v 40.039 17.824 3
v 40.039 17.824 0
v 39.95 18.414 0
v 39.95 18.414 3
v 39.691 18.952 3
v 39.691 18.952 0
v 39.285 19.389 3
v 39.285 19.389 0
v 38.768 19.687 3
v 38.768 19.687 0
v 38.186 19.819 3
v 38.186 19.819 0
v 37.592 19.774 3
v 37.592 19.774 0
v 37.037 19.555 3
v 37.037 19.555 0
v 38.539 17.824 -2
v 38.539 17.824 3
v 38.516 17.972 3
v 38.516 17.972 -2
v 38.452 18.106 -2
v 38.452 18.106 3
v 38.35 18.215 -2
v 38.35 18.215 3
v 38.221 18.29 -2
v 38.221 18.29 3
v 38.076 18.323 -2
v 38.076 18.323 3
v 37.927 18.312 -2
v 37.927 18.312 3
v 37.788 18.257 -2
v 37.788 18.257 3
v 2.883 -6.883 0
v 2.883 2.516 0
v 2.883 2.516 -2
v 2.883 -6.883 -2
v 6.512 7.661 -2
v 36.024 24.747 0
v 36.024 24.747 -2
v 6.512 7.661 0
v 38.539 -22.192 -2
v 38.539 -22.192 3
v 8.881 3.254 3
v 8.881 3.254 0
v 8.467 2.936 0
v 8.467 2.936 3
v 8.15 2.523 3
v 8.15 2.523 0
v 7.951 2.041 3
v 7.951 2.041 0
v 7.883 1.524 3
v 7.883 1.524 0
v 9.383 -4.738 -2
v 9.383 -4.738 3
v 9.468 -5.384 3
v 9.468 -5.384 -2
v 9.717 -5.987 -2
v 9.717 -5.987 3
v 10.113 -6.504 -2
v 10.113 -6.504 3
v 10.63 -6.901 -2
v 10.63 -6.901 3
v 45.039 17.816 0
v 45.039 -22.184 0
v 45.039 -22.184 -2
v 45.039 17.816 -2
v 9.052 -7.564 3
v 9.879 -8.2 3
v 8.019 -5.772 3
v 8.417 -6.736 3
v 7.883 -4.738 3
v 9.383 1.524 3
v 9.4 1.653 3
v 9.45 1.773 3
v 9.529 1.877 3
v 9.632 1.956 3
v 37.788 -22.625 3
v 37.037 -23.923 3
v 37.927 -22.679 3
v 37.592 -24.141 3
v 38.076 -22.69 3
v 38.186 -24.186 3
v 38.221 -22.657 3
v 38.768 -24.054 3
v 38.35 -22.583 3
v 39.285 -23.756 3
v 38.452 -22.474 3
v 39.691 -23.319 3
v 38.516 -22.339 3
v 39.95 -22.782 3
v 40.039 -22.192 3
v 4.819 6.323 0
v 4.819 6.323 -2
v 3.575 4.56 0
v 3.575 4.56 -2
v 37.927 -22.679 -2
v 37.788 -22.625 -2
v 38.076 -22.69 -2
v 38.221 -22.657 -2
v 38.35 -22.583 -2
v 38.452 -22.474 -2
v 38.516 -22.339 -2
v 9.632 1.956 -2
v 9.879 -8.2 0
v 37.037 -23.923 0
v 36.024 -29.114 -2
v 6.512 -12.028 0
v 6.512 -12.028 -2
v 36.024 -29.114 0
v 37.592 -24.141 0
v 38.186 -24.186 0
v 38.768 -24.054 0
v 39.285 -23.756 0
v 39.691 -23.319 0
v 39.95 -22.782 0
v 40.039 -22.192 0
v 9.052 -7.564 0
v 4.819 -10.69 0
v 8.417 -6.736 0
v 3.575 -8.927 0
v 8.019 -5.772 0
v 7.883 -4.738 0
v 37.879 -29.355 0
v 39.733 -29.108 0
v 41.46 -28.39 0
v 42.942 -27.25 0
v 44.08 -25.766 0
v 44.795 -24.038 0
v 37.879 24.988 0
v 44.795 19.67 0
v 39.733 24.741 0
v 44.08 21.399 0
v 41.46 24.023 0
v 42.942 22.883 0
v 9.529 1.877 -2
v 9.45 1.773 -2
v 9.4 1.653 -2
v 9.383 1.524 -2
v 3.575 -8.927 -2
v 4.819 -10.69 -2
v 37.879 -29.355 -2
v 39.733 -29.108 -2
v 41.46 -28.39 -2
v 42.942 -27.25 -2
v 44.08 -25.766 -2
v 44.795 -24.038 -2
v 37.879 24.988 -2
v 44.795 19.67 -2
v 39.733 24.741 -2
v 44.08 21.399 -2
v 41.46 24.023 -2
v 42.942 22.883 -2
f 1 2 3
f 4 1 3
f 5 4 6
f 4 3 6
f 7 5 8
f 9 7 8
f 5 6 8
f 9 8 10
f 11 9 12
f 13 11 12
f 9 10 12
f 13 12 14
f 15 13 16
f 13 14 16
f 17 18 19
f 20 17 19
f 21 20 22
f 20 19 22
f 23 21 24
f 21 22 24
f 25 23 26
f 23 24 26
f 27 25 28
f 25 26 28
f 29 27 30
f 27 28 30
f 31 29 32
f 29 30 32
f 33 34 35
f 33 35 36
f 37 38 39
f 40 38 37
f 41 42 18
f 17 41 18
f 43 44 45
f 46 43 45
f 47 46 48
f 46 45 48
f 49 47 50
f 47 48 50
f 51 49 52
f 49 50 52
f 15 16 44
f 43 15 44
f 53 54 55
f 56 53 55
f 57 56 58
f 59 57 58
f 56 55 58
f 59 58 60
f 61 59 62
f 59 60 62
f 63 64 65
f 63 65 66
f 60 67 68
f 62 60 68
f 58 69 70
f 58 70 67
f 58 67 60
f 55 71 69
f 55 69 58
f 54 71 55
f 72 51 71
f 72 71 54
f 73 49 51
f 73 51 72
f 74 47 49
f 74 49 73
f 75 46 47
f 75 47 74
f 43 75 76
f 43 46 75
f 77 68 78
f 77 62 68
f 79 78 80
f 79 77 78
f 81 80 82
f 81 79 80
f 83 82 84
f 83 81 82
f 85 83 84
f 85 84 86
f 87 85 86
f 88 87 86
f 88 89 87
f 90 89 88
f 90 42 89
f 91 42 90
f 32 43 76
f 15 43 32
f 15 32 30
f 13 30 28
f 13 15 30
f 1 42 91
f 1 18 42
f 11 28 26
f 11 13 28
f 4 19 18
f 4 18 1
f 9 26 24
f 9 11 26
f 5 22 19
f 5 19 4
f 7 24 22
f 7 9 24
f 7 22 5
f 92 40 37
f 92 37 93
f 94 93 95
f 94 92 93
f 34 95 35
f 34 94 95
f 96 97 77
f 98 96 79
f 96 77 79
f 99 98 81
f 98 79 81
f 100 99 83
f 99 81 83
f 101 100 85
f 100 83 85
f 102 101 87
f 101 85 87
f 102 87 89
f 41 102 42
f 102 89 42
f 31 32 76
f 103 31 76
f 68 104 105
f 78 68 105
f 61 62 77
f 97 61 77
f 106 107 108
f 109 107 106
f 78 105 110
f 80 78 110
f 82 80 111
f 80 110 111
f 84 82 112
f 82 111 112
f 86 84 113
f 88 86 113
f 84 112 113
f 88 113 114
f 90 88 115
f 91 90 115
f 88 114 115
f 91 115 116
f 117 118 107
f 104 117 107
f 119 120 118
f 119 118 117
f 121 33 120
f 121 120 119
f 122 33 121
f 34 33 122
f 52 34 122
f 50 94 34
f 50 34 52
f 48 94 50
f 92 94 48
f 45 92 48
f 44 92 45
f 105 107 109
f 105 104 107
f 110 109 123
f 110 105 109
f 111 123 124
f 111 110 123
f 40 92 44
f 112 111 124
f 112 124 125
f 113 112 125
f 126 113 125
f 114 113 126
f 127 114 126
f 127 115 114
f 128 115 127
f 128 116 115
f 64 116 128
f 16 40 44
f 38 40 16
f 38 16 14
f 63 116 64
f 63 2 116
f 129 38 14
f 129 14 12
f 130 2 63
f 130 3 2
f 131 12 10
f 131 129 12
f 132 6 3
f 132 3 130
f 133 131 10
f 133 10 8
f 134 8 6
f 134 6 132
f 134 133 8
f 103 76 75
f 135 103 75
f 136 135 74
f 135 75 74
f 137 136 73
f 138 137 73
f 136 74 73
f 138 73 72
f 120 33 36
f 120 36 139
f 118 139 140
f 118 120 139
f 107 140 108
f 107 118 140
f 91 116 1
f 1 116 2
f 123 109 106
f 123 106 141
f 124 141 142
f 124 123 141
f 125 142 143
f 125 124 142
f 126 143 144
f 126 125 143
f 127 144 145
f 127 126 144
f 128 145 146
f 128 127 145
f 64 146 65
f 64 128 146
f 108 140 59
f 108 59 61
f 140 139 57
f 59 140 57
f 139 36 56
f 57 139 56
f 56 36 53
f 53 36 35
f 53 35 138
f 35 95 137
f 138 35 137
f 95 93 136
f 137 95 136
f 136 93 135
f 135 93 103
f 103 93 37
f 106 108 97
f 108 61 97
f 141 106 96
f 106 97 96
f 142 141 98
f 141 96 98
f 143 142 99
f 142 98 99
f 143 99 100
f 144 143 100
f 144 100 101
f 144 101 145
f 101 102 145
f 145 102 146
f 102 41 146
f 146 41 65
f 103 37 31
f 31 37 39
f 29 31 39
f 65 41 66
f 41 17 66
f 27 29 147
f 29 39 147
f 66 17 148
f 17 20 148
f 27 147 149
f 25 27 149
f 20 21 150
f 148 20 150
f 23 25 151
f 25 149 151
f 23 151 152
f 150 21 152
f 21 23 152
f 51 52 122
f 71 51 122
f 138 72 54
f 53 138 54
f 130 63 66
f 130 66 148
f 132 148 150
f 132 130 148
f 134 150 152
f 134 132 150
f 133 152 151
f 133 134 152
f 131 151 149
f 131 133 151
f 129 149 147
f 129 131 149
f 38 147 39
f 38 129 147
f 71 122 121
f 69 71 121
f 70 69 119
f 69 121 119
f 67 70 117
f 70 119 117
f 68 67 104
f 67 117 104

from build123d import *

# Parameters (mm, degrees)
F2_DEPTH = 3
F4_DEPTH = 2
F6_DEPTH = 5.001


with BuildPart() as f2:
    # F1 (on face) → F2 (new body)
    with BuildSketch(Plane.XY):
        with BuildLine():
            ThreePointArc((7.882726, -4.737868), (8.417427, -6.735794), (9.87858, -8.199573))
            Line((9.87858, -8.199573), (37.036658, -23.922675))
            ThreePointArc((37.036658, -23.922675), (39.037693, -23.924472), (40.03873, -22.191823))
            Line((40.03873, -22.191823), (40.03873, -2.183715))
            Line((40.03873, -2.183715), (40.03873, 17.824393))
            ThreePointArc((40.03873, 17.824393), (39.037693, 19.557042), (37.036658, 19.555245))
            Line((37.036658, 19.555245), (8.880653, 3.254395))
            ThreePointArc((8.880653, 3.254395), (8.150077, 2.522506), (7.882726, 1.523543))
            Line((7.882726, 1.523543), (7.882726, -2.183715))
            Line((7.882726, -2.183715), (7.882726, -4.737868))
        make_face()
    extrude(amount=F2_DEPTH)

    # F3 (on face) → F4 (join)
    with BuildSketch(Plane.XY):
        with BuildLine():
            Line((6.51216, -12.028092), (36.024483, -29.11418))
            ThreePointArc((36.024483, -29.11418), (42.238428, -27.868959), (45.03873, -22.183715))
            Line((45.03873, -22.183715), (45.03873, -2.183715))
            Line((45.03873, -2.183715), (45.03873, 17.816285))
            ThreePointArc((45.03873, 17.816285), (42.238428, 23.501529), (36.024483, 24.74675))
            Line((36.024483, 24.74675), (6.51216, 7.660662))
            ThreePointArc((6.51216, 7.660662), (4.133485, 5.486051), (2.882726, 2.515759))
            Line((2.882726, 2.515759), (2.882726, -2.183715))
            Line((2.882726, -2.183715), (2.882726, -6.883189))
            ThreePointArc((2.882726, -6.883189), (4.133485, -9.853481), (6.51216, -12.028092))
        make_face()
    extrude(amount=-F4_DEPTH)

    # F5 (on face) → F6 (cut, through all)
    with BuildSketch(Plane.XY.offset(3)):
        with BuildLine():
            ThreePointArc((9.632207, 1.956256), (9.449563, 1.773284), (9.382726, 1.523543))
            Line((9.382726, 1.523543), (9.382726, -4.737868))
            ThreePointArc((9.382726, -4.737868), (9.716914, -5.986572), (10.630135, -6.901433))
            Line((10.630135, -6.901433), (37.788212, -22.624536))
            ThreePointArc((37.788212, -22.624536), (38.288471, -22.624985), (38.53873, -22.191823))
            Line((38.53873, -22.191823), (38.53873, 17.824393))
            ThreePointArc((38.53873, 17.824393), (38.288471, 18.257555), (37.788212, 18.257106))
            Line((37.788212, 18.257106), (9.632207, 1.956256))
        make_face()
    extrude(amount=-F6_DEPTH, mode=Mode.SUBTRACT)


solid = f2.part
